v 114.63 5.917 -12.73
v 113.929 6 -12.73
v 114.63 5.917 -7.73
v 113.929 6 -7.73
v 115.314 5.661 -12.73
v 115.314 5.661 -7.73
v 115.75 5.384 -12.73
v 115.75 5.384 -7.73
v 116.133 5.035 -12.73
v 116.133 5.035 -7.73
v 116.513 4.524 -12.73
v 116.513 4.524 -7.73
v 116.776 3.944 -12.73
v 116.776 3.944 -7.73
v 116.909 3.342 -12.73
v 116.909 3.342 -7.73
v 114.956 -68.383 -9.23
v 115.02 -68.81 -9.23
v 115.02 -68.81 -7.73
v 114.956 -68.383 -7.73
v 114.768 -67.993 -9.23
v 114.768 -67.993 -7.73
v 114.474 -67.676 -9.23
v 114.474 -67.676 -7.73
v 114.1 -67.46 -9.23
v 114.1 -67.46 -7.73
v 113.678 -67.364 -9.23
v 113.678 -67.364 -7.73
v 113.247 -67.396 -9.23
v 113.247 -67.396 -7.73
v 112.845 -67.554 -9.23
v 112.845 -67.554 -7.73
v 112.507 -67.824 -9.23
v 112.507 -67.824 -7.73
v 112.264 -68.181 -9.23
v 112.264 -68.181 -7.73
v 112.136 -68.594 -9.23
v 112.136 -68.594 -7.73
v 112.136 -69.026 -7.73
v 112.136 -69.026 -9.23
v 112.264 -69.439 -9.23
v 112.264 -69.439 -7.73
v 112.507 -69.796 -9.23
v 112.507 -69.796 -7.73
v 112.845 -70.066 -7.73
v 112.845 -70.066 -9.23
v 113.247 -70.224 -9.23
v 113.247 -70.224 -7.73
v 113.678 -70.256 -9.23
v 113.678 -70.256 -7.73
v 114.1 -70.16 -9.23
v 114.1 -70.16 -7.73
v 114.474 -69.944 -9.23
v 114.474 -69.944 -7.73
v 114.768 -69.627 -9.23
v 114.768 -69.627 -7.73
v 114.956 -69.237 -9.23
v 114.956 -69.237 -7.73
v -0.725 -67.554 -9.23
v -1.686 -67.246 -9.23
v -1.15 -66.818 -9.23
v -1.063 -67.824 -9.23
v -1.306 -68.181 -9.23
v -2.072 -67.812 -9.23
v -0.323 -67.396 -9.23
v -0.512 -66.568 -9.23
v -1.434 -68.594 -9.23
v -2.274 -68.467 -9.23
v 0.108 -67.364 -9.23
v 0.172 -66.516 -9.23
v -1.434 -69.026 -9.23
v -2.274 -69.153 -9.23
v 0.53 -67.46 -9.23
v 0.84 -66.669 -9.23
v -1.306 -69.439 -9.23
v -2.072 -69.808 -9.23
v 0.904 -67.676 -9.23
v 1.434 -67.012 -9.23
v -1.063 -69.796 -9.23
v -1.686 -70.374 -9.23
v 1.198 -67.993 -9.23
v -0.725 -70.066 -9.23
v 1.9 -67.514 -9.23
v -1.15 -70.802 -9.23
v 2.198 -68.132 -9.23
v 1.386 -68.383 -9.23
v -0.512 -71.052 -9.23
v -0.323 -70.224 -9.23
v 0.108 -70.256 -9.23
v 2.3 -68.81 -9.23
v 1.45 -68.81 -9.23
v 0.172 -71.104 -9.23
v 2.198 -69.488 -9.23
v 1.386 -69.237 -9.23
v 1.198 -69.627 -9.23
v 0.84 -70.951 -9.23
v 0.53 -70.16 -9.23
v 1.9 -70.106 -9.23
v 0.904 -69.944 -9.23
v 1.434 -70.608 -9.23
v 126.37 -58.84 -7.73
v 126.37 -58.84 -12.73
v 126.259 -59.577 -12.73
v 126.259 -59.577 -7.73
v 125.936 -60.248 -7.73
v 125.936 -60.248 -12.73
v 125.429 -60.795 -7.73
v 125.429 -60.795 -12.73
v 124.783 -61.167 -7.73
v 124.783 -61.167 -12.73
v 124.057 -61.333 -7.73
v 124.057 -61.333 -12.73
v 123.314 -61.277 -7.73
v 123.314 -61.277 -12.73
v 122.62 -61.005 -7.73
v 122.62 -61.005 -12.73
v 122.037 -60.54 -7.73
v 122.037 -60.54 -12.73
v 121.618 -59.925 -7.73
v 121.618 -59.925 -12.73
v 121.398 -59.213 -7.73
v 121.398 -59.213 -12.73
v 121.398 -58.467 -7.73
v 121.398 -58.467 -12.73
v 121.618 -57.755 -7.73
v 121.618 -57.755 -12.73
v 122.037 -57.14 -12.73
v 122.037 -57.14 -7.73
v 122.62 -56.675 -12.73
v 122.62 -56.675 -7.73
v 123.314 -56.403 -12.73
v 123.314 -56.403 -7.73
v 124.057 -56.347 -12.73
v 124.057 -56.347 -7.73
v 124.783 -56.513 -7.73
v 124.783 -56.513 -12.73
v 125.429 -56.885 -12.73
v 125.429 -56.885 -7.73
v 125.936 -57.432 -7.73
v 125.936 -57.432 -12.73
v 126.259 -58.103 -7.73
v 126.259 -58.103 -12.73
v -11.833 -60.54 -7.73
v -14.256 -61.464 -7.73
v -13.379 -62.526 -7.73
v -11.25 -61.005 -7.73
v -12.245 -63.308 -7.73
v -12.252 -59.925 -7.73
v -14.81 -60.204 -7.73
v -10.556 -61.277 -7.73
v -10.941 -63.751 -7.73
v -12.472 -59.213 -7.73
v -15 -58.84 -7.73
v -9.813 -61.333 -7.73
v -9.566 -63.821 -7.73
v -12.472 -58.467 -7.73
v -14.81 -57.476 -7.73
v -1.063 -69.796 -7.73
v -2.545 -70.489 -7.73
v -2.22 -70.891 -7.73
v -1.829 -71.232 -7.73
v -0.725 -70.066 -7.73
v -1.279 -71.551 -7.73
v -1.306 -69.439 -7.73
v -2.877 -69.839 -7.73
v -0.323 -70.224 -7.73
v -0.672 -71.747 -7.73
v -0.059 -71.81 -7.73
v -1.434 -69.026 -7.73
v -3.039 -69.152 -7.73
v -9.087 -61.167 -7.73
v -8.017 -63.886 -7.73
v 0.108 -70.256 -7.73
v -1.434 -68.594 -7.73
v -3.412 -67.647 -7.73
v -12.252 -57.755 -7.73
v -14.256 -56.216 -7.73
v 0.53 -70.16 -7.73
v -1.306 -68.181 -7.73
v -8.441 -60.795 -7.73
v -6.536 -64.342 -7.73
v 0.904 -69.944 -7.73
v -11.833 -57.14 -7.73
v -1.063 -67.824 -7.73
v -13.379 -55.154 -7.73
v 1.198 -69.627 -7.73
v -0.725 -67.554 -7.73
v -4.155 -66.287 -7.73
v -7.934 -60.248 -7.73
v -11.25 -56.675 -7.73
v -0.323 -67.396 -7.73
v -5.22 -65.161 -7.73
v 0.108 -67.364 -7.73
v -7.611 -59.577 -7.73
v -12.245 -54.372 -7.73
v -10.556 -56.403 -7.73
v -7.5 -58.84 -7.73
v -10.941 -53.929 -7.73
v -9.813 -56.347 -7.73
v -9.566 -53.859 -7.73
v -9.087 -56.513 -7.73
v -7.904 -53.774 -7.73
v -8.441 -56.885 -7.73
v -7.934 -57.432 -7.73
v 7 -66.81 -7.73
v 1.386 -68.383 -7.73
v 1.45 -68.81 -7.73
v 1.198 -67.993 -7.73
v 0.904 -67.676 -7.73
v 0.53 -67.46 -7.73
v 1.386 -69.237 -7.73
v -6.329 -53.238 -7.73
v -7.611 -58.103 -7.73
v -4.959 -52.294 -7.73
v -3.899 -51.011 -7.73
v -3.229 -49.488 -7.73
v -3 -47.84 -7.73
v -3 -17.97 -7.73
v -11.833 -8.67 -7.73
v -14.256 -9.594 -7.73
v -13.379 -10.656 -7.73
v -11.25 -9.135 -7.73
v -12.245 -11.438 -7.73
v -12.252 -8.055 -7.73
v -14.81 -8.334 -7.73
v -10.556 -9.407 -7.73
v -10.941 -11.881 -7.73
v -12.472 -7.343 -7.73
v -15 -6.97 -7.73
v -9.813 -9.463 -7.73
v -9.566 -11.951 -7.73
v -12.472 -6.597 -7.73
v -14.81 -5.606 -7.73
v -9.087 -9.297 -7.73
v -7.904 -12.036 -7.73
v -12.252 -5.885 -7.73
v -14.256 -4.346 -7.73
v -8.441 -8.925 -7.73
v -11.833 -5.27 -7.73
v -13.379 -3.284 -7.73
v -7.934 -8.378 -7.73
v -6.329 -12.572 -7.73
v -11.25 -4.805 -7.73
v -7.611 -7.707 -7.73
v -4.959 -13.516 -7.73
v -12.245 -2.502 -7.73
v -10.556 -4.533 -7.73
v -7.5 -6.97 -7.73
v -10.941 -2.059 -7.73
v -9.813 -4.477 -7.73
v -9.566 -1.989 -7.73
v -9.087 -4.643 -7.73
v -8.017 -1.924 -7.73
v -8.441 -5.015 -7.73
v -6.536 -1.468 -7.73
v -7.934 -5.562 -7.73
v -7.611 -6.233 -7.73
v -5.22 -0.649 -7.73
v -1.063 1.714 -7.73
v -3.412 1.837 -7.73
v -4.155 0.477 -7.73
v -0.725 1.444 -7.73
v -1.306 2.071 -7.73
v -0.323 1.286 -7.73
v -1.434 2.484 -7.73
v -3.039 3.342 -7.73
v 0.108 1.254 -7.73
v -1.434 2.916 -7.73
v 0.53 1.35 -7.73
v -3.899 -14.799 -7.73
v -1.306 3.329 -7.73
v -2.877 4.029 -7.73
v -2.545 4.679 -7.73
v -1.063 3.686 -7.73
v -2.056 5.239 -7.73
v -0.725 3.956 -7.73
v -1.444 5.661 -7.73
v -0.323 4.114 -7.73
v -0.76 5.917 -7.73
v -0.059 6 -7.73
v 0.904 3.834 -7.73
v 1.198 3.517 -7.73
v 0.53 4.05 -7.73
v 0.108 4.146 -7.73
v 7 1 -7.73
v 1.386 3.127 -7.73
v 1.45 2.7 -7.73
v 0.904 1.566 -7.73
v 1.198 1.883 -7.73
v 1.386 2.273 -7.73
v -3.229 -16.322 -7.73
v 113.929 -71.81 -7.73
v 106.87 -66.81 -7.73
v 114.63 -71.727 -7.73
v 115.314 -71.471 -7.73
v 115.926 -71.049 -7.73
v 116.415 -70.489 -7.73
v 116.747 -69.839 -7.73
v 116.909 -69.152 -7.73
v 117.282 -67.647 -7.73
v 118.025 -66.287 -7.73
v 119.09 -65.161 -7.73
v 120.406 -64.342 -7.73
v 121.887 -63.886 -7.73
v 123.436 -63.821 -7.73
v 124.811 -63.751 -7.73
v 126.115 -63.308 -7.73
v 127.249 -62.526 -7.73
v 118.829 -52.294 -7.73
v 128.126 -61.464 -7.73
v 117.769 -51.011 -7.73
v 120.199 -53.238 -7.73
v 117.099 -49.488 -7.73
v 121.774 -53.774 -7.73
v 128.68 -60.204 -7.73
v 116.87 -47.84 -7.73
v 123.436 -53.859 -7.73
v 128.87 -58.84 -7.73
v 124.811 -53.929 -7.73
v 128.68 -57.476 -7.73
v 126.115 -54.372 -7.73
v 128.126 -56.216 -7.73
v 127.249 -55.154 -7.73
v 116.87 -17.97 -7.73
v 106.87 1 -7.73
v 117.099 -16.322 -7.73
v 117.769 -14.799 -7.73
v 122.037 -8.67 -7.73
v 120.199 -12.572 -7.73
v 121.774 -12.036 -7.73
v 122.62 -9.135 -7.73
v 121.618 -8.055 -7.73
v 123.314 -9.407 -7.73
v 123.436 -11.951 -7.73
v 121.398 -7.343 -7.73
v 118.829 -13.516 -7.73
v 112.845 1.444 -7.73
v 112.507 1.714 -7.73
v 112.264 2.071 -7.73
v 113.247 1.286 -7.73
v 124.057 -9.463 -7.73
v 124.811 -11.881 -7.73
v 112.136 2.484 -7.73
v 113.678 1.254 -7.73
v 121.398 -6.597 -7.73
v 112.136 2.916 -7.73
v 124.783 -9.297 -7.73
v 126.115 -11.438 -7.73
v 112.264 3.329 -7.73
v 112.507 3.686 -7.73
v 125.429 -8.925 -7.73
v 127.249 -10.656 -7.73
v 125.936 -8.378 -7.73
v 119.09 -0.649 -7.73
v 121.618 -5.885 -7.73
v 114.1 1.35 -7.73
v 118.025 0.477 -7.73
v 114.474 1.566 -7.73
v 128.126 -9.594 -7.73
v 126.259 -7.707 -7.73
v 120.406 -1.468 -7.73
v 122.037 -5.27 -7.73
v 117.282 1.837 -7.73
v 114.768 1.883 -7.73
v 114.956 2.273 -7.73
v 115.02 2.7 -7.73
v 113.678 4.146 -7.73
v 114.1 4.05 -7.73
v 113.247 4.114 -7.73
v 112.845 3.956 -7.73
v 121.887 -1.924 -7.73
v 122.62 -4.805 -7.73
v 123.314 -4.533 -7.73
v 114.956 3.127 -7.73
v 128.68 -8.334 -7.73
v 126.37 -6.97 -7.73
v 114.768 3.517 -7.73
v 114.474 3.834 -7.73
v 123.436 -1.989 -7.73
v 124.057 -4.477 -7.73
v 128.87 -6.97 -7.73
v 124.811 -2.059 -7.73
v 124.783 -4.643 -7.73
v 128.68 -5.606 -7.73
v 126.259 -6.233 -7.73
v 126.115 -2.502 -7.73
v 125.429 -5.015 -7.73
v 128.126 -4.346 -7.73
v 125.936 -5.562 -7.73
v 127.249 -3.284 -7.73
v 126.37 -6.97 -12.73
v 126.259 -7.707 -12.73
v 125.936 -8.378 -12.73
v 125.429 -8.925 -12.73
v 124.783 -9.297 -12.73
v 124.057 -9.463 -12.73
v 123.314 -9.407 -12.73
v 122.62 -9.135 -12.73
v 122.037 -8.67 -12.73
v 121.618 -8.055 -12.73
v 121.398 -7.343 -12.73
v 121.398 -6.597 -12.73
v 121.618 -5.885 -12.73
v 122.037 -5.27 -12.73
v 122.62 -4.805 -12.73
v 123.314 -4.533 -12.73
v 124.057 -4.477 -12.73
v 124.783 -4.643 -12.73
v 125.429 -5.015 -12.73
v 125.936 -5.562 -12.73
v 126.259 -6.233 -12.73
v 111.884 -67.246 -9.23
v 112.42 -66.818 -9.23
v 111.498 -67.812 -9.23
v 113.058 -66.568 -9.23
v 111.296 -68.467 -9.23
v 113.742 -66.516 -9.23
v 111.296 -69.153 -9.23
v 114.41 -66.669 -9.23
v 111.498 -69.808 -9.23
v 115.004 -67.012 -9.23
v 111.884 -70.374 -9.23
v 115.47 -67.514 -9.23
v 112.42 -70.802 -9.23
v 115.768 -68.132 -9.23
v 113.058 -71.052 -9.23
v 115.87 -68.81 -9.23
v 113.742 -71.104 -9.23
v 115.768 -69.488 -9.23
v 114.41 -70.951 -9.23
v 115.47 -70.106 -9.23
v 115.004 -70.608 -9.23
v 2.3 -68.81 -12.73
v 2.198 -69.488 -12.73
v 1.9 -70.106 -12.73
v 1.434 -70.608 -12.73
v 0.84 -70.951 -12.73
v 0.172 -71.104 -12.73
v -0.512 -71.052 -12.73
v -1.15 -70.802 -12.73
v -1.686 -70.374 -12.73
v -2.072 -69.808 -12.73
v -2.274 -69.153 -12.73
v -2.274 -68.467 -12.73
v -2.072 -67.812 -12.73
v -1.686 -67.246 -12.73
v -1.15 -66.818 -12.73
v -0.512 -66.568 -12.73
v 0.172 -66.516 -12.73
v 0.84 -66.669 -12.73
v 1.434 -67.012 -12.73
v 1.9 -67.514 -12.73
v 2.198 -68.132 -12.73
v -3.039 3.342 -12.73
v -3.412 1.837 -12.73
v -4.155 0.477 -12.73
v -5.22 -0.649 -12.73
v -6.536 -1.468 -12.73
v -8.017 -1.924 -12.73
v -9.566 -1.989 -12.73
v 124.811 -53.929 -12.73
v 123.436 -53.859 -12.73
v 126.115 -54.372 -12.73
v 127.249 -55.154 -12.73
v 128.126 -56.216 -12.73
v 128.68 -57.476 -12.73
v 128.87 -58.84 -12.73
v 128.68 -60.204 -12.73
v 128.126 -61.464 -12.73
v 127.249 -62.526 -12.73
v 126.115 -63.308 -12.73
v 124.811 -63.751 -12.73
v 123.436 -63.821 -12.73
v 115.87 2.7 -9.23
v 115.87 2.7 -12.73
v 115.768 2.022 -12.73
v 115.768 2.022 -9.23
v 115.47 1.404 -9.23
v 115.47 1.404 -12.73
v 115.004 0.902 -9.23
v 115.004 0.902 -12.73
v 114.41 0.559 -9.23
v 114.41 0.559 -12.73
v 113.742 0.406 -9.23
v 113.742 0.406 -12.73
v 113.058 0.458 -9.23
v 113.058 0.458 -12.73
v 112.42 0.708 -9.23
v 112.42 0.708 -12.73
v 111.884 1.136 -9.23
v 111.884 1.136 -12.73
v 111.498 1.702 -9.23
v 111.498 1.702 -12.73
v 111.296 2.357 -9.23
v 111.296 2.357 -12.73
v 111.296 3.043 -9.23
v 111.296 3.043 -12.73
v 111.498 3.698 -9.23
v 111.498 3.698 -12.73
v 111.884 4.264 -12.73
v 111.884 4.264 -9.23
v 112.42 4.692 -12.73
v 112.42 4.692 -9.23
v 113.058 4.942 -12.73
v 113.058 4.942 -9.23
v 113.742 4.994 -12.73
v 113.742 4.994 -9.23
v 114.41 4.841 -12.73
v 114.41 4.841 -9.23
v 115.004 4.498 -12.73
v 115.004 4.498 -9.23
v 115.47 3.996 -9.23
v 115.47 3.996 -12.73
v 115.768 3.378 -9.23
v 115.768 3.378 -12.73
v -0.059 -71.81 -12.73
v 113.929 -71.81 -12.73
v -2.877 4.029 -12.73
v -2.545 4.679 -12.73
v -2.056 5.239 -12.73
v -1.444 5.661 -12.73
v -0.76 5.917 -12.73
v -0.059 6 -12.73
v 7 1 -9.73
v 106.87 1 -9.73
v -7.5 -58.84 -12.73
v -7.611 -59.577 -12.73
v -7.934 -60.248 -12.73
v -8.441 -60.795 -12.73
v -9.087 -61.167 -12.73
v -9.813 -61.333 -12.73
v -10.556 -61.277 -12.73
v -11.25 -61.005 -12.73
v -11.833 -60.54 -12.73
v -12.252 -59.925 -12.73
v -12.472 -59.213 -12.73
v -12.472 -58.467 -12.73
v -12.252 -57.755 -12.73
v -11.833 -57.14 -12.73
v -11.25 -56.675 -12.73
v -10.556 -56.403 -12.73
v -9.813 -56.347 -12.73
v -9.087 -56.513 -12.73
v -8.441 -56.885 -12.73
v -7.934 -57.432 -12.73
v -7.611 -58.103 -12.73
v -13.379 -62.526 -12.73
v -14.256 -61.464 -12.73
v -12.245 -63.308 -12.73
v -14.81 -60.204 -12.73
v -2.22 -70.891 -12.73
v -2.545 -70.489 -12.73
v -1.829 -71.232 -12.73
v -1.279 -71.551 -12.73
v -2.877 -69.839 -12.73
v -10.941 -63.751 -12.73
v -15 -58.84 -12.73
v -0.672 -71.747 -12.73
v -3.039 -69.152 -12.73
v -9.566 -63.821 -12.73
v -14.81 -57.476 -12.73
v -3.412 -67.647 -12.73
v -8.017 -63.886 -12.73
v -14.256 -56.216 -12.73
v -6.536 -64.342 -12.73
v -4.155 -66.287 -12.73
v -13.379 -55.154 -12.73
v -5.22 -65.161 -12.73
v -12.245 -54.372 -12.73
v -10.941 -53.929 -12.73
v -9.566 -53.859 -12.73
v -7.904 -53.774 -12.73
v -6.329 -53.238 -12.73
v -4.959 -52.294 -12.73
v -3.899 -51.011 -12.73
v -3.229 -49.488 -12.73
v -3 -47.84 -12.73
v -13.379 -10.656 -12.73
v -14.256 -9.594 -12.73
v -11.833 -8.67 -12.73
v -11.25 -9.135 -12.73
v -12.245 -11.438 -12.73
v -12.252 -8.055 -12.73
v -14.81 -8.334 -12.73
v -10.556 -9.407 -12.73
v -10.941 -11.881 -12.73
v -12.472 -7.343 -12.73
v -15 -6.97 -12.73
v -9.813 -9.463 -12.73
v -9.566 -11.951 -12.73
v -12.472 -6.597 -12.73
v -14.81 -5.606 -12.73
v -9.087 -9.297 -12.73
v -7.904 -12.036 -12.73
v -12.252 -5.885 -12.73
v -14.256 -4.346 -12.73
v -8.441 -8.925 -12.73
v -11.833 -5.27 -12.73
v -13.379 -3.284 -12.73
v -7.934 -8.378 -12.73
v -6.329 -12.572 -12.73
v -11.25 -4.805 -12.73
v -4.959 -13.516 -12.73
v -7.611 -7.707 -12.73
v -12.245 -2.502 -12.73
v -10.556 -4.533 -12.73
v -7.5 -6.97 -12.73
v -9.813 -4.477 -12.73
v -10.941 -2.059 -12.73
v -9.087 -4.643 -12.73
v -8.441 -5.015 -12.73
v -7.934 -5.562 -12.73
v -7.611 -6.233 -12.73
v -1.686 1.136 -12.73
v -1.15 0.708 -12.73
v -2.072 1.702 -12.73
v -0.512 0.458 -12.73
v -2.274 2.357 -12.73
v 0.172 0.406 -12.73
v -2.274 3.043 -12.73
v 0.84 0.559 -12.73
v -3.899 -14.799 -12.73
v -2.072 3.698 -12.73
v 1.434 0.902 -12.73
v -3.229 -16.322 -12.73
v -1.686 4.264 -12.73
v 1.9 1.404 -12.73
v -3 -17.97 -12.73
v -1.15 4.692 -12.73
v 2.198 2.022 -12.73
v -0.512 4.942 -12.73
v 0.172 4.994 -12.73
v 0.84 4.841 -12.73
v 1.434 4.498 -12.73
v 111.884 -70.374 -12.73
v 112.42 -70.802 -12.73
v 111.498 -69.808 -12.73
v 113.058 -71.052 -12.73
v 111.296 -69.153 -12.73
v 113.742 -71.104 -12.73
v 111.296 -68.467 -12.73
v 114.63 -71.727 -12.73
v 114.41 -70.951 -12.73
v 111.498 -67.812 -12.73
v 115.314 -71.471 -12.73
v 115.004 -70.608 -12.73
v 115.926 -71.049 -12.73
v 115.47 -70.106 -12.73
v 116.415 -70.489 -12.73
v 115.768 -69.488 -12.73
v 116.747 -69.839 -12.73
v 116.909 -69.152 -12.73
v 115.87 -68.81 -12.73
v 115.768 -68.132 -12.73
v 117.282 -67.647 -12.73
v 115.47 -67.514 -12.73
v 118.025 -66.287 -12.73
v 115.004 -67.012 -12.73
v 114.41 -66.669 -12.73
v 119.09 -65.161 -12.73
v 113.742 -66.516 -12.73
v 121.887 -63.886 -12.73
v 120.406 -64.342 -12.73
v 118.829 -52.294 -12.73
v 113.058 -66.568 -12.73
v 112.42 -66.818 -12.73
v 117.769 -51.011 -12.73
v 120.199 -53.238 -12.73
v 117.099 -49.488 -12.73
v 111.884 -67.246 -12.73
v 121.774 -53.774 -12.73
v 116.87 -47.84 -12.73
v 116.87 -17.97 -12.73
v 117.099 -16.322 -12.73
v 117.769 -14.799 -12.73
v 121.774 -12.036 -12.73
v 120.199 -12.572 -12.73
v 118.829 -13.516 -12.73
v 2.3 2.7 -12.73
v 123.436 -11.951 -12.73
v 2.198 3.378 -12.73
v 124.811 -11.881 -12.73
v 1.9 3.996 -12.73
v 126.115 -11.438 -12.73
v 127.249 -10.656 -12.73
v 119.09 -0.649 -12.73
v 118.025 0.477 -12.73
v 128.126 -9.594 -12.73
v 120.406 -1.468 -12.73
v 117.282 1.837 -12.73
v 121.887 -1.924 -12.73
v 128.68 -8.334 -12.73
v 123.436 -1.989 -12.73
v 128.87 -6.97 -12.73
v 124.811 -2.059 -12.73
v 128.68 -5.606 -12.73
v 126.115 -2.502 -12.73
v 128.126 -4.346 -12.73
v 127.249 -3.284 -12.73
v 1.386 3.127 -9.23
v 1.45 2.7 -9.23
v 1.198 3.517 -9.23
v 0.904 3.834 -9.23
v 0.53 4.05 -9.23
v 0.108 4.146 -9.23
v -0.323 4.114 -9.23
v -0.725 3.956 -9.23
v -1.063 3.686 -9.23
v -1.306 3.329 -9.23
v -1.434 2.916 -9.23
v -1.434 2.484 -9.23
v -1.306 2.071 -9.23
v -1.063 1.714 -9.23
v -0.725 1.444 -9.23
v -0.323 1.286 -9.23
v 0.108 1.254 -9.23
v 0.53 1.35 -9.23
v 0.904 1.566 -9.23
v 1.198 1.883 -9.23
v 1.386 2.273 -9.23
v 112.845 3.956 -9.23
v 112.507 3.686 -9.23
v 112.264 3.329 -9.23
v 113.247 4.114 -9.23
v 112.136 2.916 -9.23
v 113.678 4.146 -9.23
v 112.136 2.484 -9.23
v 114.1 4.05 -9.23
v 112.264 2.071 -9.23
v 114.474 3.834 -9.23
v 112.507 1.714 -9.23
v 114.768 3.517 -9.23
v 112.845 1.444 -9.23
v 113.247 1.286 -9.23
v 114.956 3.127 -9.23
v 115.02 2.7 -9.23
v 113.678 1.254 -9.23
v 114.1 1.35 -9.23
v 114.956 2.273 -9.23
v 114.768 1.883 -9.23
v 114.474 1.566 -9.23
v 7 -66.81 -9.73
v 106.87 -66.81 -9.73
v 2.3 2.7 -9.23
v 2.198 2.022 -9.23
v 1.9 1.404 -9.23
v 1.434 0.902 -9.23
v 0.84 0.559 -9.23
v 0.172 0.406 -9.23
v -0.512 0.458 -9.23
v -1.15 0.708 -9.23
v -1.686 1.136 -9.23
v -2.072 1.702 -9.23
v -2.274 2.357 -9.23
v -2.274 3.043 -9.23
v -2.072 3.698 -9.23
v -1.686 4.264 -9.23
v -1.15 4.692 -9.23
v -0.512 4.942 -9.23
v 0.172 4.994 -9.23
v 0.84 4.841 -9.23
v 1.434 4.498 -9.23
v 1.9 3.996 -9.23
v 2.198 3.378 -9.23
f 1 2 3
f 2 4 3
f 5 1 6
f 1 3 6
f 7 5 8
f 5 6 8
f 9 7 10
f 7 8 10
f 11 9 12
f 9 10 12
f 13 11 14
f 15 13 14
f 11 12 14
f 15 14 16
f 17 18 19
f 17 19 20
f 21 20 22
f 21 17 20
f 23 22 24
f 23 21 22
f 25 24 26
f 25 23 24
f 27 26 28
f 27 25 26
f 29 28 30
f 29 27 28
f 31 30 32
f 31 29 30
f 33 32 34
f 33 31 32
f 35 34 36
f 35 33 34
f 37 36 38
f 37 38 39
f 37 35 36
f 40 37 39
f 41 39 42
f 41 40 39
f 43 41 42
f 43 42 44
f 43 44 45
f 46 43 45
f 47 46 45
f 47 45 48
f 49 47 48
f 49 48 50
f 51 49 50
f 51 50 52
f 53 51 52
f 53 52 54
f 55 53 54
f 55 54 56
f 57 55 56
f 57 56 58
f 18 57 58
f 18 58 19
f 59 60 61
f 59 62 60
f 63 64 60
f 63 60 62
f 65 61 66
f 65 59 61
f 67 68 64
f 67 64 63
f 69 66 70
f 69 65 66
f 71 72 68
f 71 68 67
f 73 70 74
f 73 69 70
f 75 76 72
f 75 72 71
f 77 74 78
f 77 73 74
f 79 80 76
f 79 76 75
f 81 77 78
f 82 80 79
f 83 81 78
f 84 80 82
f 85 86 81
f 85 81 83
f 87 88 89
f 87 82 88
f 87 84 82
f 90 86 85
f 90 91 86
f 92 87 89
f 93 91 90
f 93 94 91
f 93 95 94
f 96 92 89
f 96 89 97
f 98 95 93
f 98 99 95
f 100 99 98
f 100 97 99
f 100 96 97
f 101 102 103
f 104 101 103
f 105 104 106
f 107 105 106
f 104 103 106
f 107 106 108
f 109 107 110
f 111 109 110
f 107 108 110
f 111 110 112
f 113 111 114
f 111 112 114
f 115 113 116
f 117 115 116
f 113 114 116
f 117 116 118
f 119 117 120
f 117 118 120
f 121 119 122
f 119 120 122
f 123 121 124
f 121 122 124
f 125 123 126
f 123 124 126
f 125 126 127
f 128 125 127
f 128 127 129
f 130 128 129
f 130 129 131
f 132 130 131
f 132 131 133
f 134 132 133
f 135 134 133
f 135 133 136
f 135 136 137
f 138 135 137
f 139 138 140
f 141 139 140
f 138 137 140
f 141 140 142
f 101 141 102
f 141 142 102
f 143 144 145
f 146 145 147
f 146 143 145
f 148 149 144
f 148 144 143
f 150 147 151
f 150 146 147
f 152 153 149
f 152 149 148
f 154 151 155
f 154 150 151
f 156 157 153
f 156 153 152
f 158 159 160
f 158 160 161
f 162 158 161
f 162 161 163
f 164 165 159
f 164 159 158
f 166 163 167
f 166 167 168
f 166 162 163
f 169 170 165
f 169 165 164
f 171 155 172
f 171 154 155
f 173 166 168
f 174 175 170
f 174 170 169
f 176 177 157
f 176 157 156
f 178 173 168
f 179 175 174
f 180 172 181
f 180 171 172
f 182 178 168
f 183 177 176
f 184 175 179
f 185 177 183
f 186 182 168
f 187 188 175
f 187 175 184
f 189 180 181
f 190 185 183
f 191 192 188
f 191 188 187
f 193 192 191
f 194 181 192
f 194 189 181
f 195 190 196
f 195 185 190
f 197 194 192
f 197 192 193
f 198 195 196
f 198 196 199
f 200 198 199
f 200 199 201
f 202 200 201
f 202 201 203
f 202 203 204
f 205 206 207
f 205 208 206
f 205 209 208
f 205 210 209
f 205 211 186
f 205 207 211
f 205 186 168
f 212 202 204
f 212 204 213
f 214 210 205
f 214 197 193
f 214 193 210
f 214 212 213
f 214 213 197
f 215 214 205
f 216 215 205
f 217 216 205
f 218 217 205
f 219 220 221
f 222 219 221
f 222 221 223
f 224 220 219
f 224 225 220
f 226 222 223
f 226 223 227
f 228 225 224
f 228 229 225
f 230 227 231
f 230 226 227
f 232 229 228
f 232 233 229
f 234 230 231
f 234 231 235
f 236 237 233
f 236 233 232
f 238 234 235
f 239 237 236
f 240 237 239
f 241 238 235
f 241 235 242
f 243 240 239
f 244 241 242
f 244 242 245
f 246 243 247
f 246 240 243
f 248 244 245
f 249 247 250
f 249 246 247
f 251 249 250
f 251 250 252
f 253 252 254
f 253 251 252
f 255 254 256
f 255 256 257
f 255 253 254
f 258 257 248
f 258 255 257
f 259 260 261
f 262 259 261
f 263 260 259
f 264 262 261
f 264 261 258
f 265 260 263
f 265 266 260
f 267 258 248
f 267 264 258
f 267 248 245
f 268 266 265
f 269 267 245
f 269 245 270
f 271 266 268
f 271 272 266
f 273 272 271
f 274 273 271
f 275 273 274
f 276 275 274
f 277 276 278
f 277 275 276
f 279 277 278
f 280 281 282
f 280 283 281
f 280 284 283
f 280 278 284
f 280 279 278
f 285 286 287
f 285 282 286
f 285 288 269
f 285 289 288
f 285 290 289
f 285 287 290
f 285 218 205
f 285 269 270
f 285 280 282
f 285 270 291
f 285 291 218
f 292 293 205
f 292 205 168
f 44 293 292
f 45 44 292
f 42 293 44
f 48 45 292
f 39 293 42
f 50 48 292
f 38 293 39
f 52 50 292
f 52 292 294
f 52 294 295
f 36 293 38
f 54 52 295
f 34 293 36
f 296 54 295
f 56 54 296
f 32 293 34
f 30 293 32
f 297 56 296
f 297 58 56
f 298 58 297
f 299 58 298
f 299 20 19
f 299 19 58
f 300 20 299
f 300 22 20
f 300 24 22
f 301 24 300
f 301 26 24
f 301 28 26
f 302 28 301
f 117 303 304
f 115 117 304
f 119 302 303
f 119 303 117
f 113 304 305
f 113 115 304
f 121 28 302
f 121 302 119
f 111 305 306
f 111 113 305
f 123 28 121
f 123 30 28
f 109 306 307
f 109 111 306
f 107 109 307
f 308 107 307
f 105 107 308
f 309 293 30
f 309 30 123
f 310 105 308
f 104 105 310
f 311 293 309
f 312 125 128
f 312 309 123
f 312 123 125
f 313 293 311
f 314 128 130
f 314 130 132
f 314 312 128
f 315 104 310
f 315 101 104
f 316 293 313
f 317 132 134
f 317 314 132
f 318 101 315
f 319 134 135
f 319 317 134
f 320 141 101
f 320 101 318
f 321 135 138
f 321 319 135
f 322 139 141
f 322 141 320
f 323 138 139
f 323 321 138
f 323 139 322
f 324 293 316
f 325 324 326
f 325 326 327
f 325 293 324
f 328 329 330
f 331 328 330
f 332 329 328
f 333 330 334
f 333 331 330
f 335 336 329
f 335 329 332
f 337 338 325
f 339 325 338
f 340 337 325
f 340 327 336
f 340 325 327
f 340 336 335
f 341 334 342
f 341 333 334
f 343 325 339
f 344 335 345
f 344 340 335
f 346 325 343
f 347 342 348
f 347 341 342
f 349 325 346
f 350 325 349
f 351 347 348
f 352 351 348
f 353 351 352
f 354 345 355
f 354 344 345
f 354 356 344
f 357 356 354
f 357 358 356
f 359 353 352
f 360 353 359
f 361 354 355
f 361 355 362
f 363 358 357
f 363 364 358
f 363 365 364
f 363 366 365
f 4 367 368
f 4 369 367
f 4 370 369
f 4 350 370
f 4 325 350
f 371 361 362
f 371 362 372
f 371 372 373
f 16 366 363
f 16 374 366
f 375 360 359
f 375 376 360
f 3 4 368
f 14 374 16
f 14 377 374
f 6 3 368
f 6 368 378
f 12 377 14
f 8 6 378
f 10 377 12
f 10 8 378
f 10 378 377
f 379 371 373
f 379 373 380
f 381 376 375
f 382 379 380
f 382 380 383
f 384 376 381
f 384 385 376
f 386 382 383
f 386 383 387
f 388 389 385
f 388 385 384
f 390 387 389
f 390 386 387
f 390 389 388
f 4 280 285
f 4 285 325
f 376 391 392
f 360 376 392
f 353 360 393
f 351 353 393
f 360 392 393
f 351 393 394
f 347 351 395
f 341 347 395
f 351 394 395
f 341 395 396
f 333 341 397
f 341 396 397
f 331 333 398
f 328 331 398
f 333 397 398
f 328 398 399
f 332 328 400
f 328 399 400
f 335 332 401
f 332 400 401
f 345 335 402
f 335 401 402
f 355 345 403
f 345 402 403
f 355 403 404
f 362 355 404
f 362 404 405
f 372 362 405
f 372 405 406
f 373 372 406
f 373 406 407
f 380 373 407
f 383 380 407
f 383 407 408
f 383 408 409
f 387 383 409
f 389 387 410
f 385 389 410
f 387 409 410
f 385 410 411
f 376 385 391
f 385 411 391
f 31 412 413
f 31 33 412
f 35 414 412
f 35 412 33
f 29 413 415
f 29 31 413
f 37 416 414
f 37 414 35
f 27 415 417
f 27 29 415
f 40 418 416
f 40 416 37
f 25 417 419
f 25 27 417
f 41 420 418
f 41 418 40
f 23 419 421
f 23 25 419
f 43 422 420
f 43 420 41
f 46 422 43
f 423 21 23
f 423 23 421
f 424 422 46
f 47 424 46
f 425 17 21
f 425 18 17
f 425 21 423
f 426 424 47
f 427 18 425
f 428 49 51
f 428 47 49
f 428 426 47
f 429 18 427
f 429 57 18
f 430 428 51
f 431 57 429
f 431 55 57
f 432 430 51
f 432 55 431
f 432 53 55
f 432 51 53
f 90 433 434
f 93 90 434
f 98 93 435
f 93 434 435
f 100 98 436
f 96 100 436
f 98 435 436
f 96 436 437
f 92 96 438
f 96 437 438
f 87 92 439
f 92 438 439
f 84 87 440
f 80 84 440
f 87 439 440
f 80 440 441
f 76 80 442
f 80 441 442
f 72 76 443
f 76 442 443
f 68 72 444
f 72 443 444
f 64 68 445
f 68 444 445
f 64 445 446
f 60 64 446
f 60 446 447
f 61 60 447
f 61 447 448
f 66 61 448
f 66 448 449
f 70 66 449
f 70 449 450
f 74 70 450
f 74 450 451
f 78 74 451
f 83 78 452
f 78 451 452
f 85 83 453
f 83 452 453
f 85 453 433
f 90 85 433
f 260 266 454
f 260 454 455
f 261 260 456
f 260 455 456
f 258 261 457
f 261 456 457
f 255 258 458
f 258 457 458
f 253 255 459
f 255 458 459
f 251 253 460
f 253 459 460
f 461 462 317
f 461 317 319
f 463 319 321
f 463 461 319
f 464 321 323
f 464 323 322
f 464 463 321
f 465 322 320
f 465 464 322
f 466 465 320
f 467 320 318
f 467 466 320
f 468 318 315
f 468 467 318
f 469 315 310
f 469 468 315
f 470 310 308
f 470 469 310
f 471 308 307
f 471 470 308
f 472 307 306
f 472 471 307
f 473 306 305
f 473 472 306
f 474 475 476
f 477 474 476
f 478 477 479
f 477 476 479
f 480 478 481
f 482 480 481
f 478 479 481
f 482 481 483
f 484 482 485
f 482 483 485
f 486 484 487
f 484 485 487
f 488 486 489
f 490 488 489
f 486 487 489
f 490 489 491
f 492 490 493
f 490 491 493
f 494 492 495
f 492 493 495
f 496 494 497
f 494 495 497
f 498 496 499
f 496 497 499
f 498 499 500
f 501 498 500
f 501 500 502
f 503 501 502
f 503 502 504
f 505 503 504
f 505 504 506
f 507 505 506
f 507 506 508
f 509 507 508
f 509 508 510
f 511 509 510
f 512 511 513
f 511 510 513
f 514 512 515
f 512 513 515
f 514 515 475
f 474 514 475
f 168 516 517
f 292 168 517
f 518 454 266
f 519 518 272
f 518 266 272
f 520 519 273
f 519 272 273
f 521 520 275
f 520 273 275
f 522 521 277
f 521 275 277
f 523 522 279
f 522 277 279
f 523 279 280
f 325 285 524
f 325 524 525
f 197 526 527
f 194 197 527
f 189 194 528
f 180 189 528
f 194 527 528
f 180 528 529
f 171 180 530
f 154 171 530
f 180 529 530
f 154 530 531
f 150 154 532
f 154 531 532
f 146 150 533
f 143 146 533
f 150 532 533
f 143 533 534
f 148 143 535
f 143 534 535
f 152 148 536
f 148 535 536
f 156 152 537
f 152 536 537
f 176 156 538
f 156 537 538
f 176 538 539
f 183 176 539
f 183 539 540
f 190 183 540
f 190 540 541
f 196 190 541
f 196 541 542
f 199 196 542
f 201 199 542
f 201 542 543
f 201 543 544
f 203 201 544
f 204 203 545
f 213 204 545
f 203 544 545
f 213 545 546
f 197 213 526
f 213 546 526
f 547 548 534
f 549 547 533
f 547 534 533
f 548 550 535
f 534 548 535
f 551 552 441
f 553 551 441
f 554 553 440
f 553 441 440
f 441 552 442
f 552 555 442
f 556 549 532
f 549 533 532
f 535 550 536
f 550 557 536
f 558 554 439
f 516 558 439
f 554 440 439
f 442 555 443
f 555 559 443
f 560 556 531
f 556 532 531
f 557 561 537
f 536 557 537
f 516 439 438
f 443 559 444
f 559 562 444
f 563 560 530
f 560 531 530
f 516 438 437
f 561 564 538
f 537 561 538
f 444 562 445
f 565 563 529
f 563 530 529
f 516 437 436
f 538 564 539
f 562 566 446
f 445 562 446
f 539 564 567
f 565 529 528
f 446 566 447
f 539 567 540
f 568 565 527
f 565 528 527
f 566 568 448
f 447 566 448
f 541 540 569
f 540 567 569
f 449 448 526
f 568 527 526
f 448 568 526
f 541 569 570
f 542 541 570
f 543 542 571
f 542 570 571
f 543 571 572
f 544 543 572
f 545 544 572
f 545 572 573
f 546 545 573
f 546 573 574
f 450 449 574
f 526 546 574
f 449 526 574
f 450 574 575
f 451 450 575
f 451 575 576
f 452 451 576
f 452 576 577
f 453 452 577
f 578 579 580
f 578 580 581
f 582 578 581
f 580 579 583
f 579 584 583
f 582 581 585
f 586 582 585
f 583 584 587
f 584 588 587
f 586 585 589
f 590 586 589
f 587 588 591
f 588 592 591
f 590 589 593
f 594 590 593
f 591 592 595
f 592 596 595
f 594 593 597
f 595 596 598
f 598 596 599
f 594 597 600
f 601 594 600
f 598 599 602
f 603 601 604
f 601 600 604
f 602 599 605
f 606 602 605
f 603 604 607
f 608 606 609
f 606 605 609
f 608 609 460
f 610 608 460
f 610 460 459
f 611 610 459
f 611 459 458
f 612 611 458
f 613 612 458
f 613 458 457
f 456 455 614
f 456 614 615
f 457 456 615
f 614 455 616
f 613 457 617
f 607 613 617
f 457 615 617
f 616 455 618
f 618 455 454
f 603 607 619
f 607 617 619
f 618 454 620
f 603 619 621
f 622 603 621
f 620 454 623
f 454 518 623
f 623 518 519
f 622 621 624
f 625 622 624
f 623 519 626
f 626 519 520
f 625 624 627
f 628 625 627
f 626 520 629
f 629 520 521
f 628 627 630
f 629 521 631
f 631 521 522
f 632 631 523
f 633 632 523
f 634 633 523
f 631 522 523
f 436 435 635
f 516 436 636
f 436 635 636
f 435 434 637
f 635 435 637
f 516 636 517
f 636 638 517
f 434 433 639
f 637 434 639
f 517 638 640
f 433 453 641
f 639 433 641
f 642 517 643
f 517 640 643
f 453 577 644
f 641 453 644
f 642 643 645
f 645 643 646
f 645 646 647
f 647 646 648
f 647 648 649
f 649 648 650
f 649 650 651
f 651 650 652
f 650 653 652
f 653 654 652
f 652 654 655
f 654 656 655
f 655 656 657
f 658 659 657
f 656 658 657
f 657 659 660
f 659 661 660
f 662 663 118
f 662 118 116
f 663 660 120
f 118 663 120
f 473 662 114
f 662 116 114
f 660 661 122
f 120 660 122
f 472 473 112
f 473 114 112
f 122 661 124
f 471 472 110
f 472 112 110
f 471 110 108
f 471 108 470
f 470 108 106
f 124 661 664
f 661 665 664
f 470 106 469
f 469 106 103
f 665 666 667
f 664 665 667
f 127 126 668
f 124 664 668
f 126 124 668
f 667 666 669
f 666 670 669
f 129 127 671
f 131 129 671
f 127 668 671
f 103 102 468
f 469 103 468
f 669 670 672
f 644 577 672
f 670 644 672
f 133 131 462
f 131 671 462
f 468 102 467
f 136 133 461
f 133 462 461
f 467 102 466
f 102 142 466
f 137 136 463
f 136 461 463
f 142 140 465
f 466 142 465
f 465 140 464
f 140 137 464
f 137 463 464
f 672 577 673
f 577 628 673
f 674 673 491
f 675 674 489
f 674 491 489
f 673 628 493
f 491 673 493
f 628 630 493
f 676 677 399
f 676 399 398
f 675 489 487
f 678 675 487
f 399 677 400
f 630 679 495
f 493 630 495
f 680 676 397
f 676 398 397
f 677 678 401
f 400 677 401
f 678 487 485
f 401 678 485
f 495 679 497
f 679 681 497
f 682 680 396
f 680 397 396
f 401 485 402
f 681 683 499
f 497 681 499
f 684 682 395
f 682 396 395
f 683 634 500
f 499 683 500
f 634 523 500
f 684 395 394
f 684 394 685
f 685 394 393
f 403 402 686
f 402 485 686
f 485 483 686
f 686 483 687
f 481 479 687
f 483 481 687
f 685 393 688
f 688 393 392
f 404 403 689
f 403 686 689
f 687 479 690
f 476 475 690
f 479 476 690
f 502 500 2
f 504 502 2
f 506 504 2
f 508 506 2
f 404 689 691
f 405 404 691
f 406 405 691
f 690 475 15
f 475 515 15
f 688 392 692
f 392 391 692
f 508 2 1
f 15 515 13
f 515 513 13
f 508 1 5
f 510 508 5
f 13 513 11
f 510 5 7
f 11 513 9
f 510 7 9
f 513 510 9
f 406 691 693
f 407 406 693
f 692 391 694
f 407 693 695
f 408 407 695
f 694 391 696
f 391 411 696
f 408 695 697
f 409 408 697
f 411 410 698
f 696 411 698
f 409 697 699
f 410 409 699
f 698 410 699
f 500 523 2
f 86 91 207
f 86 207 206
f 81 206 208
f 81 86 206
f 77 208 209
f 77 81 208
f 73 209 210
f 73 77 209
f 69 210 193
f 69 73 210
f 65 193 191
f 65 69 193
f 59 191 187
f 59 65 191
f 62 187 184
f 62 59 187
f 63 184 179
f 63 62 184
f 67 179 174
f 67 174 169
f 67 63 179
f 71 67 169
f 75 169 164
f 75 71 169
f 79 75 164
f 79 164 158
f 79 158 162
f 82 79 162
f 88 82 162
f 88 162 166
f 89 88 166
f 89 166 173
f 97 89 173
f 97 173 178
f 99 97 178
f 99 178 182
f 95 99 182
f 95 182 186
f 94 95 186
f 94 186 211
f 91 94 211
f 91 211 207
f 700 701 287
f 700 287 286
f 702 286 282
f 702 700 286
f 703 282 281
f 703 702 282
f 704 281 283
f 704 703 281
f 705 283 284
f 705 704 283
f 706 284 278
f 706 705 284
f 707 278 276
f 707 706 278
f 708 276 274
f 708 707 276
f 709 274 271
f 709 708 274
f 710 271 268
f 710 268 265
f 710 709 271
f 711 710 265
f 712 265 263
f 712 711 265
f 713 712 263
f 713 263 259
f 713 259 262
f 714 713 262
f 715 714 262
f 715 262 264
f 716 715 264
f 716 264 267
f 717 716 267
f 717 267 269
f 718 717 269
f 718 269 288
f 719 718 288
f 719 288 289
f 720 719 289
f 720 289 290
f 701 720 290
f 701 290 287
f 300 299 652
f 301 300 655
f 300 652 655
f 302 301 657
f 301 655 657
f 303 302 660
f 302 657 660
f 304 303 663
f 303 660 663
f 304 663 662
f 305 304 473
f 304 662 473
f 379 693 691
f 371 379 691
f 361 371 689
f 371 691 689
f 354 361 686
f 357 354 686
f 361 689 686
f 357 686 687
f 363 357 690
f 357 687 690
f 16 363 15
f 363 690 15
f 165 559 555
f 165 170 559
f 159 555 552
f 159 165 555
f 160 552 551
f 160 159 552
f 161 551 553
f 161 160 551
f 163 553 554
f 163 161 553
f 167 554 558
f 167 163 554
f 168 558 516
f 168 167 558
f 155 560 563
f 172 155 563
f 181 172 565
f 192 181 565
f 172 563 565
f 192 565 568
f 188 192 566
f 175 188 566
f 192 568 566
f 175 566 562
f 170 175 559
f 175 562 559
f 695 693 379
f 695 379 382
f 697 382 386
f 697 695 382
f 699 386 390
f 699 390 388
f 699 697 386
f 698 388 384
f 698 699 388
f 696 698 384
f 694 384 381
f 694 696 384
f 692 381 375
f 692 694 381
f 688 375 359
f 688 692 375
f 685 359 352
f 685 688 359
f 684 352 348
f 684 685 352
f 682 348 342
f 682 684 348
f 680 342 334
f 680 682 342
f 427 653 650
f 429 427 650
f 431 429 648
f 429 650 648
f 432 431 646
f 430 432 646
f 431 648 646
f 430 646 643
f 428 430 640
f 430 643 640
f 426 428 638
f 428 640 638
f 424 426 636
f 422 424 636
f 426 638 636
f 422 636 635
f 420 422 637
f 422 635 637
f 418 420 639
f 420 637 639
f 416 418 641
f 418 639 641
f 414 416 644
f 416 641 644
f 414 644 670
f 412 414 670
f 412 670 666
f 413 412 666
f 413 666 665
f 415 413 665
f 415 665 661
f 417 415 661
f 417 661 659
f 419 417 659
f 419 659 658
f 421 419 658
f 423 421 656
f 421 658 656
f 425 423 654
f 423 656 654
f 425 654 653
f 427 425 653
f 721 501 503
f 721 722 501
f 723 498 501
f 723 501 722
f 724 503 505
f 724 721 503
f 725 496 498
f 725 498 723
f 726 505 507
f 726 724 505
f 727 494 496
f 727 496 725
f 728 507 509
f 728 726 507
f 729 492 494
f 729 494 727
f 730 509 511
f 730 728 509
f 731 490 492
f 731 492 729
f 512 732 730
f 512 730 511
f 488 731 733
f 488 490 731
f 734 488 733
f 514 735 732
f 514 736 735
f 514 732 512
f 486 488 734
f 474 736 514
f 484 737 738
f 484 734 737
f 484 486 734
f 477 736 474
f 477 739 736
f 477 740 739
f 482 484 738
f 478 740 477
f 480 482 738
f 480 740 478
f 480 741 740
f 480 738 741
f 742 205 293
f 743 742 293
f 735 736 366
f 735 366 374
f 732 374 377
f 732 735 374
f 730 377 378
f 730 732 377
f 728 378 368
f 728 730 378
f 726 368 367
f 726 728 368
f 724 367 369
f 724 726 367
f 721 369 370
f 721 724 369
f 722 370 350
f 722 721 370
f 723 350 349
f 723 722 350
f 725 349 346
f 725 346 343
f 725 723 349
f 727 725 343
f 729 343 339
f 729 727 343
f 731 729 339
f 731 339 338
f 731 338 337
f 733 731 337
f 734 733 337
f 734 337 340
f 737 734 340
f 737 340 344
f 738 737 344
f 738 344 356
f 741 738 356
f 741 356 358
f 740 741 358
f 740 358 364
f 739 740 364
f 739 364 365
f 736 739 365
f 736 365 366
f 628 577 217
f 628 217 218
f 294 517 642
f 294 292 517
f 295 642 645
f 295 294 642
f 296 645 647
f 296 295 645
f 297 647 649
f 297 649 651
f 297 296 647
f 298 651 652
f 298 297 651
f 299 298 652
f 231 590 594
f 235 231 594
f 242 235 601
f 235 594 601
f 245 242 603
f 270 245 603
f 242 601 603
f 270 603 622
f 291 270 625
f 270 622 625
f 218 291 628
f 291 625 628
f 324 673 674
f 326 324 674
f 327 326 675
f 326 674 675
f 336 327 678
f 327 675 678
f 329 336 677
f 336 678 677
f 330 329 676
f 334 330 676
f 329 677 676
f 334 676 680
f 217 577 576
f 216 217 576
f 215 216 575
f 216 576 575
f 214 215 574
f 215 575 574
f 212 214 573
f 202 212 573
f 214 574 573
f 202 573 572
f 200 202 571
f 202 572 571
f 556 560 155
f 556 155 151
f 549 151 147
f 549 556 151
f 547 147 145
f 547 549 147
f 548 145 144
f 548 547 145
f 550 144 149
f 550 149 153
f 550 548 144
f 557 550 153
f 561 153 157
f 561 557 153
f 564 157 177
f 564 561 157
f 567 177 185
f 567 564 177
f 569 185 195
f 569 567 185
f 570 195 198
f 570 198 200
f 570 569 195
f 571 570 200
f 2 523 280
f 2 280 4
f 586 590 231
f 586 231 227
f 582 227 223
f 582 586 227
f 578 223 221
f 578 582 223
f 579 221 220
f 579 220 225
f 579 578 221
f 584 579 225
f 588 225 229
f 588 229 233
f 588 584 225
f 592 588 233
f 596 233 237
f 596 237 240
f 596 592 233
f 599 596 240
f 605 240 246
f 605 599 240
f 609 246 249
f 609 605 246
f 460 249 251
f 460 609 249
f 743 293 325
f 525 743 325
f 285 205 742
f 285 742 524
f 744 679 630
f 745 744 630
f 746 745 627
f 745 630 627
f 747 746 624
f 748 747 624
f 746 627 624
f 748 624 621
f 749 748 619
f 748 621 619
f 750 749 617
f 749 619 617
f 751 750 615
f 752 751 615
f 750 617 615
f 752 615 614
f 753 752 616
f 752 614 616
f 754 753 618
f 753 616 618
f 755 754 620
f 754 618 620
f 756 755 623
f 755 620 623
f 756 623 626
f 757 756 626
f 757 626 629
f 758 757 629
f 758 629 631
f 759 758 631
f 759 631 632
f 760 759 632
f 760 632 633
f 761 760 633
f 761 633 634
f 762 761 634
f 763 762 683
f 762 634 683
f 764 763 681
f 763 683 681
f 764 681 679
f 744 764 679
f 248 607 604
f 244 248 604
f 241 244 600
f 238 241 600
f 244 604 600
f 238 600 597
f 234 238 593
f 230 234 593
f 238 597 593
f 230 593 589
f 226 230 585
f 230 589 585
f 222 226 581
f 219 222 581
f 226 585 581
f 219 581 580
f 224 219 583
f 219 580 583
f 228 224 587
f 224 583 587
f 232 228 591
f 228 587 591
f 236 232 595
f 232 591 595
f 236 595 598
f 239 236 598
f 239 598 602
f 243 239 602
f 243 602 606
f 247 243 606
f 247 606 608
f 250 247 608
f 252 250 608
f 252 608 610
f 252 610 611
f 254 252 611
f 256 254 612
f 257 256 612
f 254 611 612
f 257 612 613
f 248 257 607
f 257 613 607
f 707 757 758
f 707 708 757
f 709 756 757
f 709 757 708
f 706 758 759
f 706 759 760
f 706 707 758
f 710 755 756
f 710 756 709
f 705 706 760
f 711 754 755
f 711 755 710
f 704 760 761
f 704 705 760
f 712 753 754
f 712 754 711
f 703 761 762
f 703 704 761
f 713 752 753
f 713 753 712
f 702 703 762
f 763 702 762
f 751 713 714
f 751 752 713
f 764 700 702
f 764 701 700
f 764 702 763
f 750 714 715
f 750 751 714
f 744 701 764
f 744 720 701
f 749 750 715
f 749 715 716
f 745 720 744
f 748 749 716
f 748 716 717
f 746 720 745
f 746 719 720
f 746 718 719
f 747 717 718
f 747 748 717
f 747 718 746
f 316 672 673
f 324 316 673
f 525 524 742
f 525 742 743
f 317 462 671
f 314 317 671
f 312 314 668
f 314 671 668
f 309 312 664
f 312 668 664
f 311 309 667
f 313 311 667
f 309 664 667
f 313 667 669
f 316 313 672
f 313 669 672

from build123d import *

# Parameters (mm, degrees)
SKETCH_W        = 119.87
SKETCH_H        = 77.81
SKETCH_R        = 1.45
PAD_DEPTH       = 5
SKETCH045_R     = 2.5
PAD032_DEPTH    = 5
SKETCH046_R     = 2.3
POCKET_DEPTH    = 3.5
SKETCH051_W     = 99.87
SKETCH051_H     = 67.81
POCKET012_DEPTH = 2
FILLET001_R     = 3


with BuildPart() as part:
    # Sketch → Pad (new body)
    with BuildSketch(Plane.XY):
        with Locations((56.935, -32.905)):
            Rectangle(SKETCH_W, SKETCH_H)
        with Locations((0, -68.81)):
            Circle(SKETCH_R, mode=Mode.SUBTRACT)
        with Locations((113.57, -68.81)):
            Circle(SKETCH_R, mode=Mode.SUBTRACT)
        with Locations((113.57, 2.7)):
            Circle(SKETCH_R, mode=Mode.SUBTRACT)
        with Locations((0, 2.7)):
            Circle(SKETCH_R, mode=Mode.SUBTRACT)
    extrude(amount=PAD_DEPTH)

    # Sketch045 (on Face9 of Pad) → Pad032 (join)
    with BuildSketch(Plane(origin=(0, 0, 0), x_dir=(1, 0, 0), z_dir=(0, 0, -1))):
        with BuildLine():
            ThreePointArc((-9.566038, 63.821132), (-15, 58.84), (-9.566038, 53.858868))
            ThreePointArc((-3, 47.84), (-4.959164, 52.29364), (-9.566038, 53.858868))
            Line((-3, 69.84), (-3, 47.84))
            ThreePointArc((-9.566038, 63.821132), (-4.959164, 65.38636), (-3, 69.84))
        make_face()
        with Locations((-10, 58.84)):
            Circle(SKETCH045_R, mode=Mode.SUBTRACT)
        with BuildLine():
            ThreePointArc((-9.566038, 11.951132), (-15, 6.97), (-9.566038, 1.988868))
            ThreePointArc((-3, -4.03), (-4.959164, 0.42364), (-9.566038, 1.988868))
            Line((-3, 17.97), (-3, -4.03))
            ThreePointArc((-9.566038, 11.951132), (-4.959164, 13.51636), (-3, 17.97))
        make_face()
        with Locations((-10, 6.97)):
            Circle(SKETCH045_R, mode=Mode.SUBTRACT)
        with BuildLine():
            ThreePointArc((123.436038, 1.988868), (128.87, 6.97), (123.436038, 11.951132))
            ThreePointArc((116.87, 17.97), (118.829164, 13.51636), (123.436038, 11.951132))
            Line((116.87, 17.97), (116.87, -4.03))
            ThreePointArc((123.436038, 1.988868), (118.829164, 0.42364), (116.87, -4.03))
        make_face()
        with Locations((123.87, 6.97)):
            Circle(SKETCH045_R, mode=Mode.SUBTRACT)
        with BuildLine():
            ThreePointArc((123.436038, 53.858868), (128.87, 58.84), (123.436038, 63.821132))
            ThreePointArc((116.87, 69.84), (118.829164, 65.38636), (123.436038, 63.821132))
            Line((116.87, 69.84), (116.87, 47.84))
            ThreePointArc((123.436038, 53.858868), (118.829164, 52.29364), (116.87, 47.84))
        make_face()
        with Locations((123.87, 58.84)):
            Circle(SKETCH045_R, mode=Mode.SUBTRACT)
    extrude(amount=-PAD032_DEPTH)

    # Sketch046 (on Face21 of Pad032) → Pocket (cut)
    with BuildSketch(Plane(origin=(0, 0, 0), x_dir=(1, 0, 0), z_dir=(0, 0, -1))):
        with Locations((0, -2.7)):
            Circle(SKETCH046_R)
        with Locations((113.57, -2.7)):
            Circle(SKETCH046_R)
        with Locations((113.57, 68.81)):
            Circle(SKETCH046_R)
        with Locations((0, 68.81)):
            Circle(SKETCH046_R)
    extrude(amount=-POCKET_DEPTH, mode=Mode.SUBTRACT)

    # Sketch051 (on Face4 of Pocket) → Pocket012 (cut)
    with BuildSketch(Plane.XY.offset(5)):
        with Locations((56.935, -32.905)):
            Rectangle(SKETCH051_W, SKETCH051_H)
    extrude(amount=-POCKET012_DEPTH, mode=Mode.SUBTRACT)

    # Fillet001
    fillet001_edges = [part.edges().sort_by_distance(p)[0] for p in [
        (116.87, -71.81, 2.5),
        (-3, -71.81, 2.5),
        (-3, 6, 2.5),
        (116.87, 6, 2.5),
    ]]
    fillet(fillet001_edges, radius=FILLET001_R)


with BuildPart() as part_1:
    # Body placement: moved
    add(part.part.moved(Location((0, 0, -12.73))))


solid = part_1.part
